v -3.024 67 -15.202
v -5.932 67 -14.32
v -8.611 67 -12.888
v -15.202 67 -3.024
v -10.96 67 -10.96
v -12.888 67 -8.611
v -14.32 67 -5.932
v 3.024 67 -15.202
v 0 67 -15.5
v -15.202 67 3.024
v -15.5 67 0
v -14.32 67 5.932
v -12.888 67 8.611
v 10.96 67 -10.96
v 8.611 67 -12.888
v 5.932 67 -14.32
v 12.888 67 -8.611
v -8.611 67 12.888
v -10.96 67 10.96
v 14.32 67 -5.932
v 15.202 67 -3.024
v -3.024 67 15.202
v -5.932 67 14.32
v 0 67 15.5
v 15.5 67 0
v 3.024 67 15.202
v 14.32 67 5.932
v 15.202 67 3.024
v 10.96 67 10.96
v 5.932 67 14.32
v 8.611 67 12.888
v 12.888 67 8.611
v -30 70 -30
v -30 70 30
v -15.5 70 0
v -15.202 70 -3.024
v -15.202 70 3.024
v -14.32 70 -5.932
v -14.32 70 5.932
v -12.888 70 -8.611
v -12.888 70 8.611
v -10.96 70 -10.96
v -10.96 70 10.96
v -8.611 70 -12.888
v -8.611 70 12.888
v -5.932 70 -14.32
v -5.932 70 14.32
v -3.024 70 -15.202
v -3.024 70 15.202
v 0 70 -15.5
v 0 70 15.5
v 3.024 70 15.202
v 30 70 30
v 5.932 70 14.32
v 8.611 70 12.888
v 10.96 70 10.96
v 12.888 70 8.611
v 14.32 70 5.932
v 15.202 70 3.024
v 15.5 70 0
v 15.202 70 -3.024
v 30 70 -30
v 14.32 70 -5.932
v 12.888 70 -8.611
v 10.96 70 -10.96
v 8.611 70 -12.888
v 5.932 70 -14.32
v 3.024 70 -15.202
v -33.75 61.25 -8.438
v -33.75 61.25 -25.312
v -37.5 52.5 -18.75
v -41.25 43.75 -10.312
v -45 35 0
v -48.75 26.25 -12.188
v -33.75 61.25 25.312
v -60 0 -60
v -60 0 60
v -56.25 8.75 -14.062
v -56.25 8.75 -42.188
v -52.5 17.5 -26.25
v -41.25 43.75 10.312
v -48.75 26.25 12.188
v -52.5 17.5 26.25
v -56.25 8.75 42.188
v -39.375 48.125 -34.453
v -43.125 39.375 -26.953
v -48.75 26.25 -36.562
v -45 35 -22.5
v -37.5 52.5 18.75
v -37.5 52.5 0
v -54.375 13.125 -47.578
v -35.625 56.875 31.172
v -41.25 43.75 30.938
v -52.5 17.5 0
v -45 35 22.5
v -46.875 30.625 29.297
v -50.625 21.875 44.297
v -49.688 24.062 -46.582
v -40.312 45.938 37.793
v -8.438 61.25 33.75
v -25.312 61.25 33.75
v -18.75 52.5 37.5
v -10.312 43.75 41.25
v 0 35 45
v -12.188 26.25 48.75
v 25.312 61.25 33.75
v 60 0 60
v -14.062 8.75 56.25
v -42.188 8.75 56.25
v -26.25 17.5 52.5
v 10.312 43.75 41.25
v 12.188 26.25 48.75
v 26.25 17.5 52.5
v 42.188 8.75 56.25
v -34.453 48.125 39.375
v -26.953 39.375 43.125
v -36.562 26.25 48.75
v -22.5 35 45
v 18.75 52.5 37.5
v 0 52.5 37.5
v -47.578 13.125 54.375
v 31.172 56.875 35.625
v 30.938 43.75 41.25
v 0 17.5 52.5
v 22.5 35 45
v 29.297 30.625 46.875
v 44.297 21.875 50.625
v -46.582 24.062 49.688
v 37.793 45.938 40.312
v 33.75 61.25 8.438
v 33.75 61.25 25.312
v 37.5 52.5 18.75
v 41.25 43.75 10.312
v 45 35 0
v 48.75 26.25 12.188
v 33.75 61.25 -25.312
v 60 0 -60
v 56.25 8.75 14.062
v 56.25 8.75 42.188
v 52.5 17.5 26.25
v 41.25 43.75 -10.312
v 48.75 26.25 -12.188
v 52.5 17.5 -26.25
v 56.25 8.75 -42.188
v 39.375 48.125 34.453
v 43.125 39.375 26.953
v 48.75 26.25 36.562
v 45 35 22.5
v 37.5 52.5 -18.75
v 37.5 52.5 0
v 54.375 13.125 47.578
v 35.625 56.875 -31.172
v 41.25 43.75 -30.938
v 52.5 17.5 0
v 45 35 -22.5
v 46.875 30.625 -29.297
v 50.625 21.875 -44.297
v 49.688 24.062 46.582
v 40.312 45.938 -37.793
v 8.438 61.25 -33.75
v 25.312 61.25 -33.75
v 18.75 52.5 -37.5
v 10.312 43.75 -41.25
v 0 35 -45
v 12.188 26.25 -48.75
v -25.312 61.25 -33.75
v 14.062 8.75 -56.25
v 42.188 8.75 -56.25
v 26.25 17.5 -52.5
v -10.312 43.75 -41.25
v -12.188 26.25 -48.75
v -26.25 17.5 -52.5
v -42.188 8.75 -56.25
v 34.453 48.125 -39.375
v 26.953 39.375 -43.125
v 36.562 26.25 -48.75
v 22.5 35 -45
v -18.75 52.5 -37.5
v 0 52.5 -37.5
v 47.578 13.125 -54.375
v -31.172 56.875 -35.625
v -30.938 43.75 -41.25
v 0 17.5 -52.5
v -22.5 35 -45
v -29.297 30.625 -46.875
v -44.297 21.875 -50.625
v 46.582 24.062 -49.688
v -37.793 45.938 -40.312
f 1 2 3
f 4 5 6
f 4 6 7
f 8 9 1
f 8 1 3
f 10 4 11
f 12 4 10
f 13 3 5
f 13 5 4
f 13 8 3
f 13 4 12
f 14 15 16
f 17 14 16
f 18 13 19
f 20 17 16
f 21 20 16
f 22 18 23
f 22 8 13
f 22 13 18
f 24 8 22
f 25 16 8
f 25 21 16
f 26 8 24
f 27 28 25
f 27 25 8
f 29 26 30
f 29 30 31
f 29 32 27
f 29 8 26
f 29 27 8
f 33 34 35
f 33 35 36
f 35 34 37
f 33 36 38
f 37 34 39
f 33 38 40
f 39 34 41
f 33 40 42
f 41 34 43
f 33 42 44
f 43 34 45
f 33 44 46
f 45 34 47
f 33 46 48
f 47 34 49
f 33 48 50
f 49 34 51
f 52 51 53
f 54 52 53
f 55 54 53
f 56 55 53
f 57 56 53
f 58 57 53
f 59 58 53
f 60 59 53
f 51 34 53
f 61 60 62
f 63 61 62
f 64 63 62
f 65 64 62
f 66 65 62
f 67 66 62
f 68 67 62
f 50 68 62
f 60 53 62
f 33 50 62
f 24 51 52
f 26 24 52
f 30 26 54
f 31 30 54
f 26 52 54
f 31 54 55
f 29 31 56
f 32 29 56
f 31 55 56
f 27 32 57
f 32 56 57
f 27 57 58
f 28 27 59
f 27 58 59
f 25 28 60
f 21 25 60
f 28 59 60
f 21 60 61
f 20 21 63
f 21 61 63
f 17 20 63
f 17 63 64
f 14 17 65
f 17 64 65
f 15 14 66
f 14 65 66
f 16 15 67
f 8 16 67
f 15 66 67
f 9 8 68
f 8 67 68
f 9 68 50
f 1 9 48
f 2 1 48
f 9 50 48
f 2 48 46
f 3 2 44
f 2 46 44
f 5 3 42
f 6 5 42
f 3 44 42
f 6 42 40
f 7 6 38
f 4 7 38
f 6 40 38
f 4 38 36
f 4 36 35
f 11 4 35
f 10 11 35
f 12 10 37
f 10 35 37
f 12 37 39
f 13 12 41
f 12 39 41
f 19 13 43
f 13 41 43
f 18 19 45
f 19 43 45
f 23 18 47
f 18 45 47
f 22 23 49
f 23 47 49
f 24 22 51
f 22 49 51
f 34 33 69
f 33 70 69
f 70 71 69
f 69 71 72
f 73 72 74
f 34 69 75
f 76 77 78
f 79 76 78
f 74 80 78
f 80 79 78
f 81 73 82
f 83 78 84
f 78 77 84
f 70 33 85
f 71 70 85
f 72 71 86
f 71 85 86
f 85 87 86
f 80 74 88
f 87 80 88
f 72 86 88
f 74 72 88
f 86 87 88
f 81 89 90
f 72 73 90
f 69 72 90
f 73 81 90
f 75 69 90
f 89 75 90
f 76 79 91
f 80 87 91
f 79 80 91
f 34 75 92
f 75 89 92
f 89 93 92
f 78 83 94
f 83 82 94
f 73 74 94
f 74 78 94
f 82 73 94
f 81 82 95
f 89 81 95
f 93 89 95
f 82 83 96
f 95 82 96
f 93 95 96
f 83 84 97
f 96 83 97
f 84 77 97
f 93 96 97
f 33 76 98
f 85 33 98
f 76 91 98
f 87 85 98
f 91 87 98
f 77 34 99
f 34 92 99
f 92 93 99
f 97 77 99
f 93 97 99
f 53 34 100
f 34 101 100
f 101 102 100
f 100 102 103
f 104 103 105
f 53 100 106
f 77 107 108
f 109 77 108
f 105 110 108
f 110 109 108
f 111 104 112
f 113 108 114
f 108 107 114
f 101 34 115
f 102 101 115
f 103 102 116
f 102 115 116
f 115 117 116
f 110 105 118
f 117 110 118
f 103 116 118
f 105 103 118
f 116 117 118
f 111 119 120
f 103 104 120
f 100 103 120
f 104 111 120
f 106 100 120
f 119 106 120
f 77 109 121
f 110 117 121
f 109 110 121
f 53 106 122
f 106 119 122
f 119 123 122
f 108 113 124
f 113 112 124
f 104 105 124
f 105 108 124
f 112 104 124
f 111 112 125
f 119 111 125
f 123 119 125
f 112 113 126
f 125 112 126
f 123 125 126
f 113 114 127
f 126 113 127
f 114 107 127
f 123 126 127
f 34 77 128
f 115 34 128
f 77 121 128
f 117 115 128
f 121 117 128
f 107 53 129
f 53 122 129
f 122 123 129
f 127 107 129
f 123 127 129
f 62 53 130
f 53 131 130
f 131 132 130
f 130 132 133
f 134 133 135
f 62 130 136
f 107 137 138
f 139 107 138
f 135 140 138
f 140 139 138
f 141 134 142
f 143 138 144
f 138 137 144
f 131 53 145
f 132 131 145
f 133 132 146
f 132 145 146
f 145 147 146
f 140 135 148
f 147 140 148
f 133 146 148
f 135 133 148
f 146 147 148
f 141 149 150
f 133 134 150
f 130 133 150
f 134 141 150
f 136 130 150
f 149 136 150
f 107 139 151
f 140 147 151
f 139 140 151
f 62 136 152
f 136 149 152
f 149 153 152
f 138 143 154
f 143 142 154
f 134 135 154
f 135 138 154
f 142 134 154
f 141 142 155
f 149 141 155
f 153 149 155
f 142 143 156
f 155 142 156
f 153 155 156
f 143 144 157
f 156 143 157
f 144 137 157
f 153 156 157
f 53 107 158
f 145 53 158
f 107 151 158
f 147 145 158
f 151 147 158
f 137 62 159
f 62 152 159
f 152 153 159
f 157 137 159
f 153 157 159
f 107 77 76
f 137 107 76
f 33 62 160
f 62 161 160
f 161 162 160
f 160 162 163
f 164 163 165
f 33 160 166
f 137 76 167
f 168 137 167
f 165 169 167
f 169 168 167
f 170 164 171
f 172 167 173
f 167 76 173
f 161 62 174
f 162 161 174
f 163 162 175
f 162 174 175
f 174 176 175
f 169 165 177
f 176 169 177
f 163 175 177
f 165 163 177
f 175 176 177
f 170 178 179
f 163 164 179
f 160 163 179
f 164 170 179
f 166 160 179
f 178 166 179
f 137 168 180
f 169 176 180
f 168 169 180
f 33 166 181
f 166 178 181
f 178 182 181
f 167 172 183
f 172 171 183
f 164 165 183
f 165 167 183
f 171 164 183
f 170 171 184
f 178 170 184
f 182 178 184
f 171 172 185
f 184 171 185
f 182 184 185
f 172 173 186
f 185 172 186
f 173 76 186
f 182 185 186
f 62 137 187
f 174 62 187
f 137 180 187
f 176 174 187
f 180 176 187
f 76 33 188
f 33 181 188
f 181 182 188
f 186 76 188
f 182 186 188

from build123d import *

# Parameters (mm, degrees)
SKETCH_3_R          = 15.5
CUT_EXTRUDE_1_DEPTH = 3


with BuildPart() as part:
    # 草图2 → 放样1 section 0
    with BuildSketch(Plane(origin=(0, 70, 0), x_dir=(1, 0, 0), z_dir=(0, 1, 0))):
        with BuildLine():
            Line((-30, -30), (30, -30))
            Line((30, -30), (30, 30))
            Line((30, 30), (-30, 30))
            Line((-30, 30), (-30, -30))
        make_face()
    # 草图1 → 放样1 section 1
    with BuildSketch(Plane(origin=(0, 0, 0), x_dir=(1, 0, 0), z_dir=(0, 1, 0))):
        with BuildLine():
            Line((-60, -60), (60, -60))
            Line((60, -60), (60, 60))
            Line((60, 60), (-60, 60))
            Line((-60, 60), (-60, -60))
        make_face()
    loft()

    # 草图3 → 切除-拉伸1 (cut)
    with BuildSketch(Plane(origin=(0, 70, 0), x_dir=(1, 0, 0), z_dir=(0, 1, 0))):
        with Locations(Location((0, 0, 0), (0, 0, 270))):
            Circle(SKETCH_3_R)
    extrude(amount=-CUT_EXTRUDE_1_DEPTH, mode=Mode.SUBTRACT)


solid = part.part
